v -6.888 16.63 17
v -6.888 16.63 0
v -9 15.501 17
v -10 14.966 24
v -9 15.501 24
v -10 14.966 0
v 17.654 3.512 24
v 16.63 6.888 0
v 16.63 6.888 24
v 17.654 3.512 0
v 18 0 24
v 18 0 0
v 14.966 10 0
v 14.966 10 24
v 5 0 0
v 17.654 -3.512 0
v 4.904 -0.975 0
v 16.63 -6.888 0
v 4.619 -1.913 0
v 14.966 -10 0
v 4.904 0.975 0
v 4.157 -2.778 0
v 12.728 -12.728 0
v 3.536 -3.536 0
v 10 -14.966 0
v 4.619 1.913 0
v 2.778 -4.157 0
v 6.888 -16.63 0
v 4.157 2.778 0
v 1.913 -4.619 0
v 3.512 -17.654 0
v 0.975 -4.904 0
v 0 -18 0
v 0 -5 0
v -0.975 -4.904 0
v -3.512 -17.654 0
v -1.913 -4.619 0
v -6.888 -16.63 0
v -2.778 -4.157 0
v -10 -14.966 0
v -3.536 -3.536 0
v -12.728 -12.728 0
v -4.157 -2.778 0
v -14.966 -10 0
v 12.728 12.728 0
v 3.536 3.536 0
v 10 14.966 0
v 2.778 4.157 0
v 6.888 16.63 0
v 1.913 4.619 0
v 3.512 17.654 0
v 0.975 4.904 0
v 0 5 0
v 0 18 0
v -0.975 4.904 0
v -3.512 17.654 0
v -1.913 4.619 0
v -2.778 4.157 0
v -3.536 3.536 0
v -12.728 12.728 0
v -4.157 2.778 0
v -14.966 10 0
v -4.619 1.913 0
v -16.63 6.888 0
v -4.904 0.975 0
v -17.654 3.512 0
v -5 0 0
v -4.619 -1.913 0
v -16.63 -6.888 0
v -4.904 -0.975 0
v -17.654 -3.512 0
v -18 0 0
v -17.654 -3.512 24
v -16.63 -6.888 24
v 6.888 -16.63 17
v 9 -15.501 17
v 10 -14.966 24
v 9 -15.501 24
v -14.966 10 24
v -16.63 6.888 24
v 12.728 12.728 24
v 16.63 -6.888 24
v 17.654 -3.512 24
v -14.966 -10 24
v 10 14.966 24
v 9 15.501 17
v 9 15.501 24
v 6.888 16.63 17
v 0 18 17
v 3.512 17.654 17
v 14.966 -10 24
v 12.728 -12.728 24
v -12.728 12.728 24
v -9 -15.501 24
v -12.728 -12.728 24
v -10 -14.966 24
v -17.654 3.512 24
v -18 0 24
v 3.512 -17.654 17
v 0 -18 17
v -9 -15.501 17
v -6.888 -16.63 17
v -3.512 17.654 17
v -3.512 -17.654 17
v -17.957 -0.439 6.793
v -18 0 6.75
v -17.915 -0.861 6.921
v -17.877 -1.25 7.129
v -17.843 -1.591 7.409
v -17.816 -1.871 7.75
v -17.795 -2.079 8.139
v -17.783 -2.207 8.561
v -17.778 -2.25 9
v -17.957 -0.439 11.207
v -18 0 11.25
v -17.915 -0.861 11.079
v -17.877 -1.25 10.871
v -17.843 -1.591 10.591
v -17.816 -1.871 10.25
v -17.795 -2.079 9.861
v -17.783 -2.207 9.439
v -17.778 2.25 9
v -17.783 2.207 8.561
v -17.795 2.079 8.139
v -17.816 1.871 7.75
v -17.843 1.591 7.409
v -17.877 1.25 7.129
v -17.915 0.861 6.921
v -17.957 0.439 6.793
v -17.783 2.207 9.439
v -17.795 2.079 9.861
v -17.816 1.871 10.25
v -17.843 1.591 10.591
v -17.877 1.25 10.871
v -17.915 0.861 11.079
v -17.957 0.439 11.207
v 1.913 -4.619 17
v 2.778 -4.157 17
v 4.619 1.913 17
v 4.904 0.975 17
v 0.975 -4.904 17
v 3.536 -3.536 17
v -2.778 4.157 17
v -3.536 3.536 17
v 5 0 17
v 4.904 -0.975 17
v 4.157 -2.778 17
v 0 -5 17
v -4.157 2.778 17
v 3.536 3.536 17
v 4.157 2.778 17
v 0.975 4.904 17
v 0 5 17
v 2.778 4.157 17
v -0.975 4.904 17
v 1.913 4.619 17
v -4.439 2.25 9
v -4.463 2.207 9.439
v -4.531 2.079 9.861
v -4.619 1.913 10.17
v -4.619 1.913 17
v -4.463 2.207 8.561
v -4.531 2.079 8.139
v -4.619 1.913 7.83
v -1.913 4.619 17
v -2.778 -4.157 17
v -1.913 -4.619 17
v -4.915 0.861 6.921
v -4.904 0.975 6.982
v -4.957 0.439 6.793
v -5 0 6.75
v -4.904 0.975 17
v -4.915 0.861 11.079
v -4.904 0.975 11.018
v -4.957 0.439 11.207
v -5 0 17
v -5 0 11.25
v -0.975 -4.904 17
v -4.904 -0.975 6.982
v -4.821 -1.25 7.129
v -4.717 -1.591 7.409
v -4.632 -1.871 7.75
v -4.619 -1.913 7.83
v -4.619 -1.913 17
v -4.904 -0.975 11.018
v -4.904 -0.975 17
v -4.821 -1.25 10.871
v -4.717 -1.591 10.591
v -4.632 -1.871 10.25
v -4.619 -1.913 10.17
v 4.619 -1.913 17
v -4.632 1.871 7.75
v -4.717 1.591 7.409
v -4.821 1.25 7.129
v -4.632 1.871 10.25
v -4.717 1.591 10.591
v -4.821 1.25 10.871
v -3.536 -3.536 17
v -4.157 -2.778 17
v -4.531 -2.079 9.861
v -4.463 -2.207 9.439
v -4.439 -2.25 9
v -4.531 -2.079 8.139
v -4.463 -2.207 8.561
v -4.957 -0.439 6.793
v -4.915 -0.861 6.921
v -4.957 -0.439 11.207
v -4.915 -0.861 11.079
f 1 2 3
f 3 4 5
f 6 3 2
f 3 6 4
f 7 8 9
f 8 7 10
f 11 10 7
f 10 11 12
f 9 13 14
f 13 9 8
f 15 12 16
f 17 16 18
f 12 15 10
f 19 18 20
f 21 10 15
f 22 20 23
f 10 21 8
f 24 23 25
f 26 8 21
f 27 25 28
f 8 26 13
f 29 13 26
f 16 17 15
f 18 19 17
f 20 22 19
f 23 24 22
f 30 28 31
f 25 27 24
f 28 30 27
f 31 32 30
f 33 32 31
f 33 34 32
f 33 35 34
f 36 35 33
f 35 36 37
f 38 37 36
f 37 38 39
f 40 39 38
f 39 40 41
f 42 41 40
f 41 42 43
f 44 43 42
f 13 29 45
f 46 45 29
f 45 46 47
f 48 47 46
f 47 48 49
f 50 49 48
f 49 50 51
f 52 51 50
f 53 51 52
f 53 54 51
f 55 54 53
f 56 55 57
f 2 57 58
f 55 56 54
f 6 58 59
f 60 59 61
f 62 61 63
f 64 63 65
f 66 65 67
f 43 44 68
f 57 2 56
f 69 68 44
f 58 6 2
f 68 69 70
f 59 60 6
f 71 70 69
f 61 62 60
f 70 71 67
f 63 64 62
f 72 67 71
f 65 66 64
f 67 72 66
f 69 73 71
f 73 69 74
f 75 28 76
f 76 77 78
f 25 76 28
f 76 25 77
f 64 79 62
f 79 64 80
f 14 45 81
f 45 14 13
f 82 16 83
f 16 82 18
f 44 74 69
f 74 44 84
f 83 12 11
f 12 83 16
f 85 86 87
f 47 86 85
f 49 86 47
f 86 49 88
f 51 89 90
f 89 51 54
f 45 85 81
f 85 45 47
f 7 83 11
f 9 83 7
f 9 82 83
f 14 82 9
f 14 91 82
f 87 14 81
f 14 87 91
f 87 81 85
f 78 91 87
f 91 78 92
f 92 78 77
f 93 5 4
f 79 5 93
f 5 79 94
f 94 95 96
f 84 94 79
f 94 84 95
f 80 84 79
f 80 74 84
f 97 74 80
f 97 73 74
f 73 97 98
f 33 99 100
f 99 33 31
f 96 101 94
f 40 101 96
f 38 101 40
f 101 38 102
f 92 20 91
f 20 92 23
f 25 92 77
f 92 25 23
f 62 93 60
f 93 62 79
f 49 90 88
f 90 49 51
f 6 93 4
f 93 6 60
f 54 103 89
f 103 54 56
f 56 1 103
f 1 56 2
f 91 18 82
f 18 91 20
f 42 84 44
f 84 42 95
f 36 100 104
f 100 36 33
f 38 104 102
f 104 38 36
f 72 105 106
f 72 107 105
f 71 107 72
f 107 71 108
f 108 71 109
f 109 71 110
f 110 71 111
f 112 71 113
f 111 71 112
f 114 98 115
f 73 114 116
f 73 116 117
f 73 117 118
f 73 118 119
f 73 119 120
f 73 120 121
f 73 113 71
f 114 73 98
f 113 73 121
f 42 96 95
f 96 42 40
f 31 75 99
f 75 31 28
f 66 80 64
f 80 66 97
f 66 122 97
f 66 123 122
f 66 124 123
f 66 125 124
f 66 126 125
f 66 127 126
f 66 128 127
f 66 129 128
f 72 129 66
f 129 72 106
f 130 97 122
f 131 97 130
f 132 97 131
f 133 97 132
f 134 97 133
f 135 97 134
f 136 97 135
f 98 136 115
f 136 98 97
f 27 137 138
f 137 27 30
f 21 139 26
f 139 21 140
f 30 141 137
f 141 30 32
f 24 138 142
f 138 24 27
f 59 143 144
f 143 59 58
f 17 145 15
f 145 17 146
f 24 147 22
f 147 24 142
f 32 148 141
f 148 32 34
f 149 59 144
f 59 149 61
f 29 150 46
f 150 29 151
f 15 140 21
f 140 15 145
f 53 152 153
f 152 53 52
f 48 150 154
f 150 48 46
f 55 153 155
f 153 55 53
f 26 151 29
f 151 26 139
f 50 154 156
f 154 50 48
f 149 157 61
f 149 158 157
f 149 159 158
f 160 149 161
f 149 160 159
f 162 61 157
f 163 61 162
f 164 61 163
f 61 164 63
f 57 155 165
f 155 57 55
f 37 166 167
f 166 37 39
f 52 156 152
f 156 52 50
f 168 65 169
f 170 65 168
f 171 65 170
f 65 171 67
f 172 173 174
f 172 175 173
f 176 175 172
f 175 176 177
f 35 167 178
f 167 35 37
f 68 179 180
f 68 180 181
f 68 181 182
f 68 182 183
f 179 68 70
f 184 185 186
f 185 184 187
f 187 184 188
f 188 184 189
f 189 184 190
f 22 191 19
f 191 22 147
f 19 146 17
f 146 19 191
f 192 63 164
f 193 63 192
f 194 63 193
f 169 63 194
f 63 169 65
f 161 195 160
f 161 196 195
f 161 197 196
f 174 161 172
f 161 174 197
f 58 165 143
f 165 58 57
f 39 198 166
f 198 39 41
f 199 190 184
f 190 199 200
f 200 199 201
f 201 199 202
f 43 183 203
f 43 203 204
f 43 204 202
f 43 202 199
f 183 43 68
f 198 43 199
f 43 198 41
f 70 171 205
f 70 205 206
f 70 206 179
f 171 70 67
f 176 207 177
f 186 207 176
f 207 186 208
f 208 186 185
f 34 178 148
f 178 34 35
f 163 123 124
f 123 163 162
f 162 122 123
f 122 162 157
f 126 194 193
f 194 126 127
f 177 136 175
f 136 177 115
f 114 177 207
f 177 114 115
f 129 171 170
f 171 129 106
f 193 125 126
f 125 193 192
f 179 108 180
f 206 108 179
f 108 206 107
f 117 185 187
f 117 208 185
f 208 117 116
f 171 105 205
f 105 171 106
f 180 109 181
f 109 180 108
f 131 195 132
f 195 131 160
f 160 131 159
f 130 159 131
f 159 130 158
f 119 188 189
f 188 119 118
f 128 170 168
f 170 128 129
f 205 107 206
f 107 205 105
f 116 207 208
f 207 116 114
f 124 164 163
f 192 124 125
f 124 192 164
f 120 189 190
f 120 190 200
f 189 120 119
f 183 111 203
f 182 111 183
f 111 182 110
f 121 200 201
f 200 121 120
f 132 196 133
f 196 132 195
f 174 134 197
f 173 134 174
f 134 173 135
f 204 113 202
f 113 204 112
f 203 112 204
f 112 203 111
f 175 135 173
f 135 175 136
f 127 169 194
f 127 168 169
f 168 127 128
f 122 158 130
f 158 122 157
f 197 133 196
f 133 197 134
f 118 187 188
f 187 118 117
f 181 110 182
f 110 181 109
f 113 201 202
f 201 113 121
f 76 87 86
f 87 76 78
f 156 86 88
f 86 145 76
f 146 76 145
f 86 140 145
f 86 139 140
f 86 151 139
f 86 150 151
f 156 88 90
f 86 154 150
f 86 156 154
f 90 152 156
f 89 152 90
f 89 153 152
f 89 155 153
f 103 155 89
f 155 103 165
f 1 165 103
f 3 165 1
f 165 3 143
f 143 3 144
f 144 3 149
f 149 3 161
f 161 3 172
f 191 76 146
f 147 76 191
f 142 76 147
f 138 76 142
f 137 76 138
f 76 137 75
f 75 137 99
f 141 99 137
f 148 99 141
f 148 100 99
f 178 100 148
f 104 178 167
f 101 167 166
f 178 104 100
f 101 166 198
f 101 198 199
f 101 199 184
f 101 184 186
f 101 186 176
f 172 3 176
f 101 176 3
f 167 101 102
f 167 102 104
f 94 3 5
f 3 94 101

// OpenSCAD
$fn = 32;

// ----------------------------------------------------------------------
// Oldham coupling hub: 36 x 24 mm
// ----------------------------------------------------------------------

// --- parameters (mm) ---
flange_dia = 36;          // hub diameter
flange_len = 18;          // hub length
hub_bore = 10;            // shaft bore
key_w = 18;               // drive tongue width
tongue_h = 6;             // drive tongue height
set_d = 4.5;              // set screw tap hole

module hub() {
  /* the slot side is a raised disc with a groove milled across it */
  cylinder(h = flange_len + tongue_h, d = flange_dia);
}

difference() {
  hub();
  translate([0, 0, -1]) cylinder(h = flange_len + tongue_h + 2, d = hub_bore);
  translate([-flange_dia / 2 - 1, 0, flange_len * 0.5])
    rotate([0, 90, 0]) cylinder(h = flange_dia / 2 + 2, d = set_d);
  translate([-key_w / 2, -flange_dia / 2 - 1, flange_len - 1])
    cube([key_w, flange_dia + 2, tongue_h + 1]);
}
